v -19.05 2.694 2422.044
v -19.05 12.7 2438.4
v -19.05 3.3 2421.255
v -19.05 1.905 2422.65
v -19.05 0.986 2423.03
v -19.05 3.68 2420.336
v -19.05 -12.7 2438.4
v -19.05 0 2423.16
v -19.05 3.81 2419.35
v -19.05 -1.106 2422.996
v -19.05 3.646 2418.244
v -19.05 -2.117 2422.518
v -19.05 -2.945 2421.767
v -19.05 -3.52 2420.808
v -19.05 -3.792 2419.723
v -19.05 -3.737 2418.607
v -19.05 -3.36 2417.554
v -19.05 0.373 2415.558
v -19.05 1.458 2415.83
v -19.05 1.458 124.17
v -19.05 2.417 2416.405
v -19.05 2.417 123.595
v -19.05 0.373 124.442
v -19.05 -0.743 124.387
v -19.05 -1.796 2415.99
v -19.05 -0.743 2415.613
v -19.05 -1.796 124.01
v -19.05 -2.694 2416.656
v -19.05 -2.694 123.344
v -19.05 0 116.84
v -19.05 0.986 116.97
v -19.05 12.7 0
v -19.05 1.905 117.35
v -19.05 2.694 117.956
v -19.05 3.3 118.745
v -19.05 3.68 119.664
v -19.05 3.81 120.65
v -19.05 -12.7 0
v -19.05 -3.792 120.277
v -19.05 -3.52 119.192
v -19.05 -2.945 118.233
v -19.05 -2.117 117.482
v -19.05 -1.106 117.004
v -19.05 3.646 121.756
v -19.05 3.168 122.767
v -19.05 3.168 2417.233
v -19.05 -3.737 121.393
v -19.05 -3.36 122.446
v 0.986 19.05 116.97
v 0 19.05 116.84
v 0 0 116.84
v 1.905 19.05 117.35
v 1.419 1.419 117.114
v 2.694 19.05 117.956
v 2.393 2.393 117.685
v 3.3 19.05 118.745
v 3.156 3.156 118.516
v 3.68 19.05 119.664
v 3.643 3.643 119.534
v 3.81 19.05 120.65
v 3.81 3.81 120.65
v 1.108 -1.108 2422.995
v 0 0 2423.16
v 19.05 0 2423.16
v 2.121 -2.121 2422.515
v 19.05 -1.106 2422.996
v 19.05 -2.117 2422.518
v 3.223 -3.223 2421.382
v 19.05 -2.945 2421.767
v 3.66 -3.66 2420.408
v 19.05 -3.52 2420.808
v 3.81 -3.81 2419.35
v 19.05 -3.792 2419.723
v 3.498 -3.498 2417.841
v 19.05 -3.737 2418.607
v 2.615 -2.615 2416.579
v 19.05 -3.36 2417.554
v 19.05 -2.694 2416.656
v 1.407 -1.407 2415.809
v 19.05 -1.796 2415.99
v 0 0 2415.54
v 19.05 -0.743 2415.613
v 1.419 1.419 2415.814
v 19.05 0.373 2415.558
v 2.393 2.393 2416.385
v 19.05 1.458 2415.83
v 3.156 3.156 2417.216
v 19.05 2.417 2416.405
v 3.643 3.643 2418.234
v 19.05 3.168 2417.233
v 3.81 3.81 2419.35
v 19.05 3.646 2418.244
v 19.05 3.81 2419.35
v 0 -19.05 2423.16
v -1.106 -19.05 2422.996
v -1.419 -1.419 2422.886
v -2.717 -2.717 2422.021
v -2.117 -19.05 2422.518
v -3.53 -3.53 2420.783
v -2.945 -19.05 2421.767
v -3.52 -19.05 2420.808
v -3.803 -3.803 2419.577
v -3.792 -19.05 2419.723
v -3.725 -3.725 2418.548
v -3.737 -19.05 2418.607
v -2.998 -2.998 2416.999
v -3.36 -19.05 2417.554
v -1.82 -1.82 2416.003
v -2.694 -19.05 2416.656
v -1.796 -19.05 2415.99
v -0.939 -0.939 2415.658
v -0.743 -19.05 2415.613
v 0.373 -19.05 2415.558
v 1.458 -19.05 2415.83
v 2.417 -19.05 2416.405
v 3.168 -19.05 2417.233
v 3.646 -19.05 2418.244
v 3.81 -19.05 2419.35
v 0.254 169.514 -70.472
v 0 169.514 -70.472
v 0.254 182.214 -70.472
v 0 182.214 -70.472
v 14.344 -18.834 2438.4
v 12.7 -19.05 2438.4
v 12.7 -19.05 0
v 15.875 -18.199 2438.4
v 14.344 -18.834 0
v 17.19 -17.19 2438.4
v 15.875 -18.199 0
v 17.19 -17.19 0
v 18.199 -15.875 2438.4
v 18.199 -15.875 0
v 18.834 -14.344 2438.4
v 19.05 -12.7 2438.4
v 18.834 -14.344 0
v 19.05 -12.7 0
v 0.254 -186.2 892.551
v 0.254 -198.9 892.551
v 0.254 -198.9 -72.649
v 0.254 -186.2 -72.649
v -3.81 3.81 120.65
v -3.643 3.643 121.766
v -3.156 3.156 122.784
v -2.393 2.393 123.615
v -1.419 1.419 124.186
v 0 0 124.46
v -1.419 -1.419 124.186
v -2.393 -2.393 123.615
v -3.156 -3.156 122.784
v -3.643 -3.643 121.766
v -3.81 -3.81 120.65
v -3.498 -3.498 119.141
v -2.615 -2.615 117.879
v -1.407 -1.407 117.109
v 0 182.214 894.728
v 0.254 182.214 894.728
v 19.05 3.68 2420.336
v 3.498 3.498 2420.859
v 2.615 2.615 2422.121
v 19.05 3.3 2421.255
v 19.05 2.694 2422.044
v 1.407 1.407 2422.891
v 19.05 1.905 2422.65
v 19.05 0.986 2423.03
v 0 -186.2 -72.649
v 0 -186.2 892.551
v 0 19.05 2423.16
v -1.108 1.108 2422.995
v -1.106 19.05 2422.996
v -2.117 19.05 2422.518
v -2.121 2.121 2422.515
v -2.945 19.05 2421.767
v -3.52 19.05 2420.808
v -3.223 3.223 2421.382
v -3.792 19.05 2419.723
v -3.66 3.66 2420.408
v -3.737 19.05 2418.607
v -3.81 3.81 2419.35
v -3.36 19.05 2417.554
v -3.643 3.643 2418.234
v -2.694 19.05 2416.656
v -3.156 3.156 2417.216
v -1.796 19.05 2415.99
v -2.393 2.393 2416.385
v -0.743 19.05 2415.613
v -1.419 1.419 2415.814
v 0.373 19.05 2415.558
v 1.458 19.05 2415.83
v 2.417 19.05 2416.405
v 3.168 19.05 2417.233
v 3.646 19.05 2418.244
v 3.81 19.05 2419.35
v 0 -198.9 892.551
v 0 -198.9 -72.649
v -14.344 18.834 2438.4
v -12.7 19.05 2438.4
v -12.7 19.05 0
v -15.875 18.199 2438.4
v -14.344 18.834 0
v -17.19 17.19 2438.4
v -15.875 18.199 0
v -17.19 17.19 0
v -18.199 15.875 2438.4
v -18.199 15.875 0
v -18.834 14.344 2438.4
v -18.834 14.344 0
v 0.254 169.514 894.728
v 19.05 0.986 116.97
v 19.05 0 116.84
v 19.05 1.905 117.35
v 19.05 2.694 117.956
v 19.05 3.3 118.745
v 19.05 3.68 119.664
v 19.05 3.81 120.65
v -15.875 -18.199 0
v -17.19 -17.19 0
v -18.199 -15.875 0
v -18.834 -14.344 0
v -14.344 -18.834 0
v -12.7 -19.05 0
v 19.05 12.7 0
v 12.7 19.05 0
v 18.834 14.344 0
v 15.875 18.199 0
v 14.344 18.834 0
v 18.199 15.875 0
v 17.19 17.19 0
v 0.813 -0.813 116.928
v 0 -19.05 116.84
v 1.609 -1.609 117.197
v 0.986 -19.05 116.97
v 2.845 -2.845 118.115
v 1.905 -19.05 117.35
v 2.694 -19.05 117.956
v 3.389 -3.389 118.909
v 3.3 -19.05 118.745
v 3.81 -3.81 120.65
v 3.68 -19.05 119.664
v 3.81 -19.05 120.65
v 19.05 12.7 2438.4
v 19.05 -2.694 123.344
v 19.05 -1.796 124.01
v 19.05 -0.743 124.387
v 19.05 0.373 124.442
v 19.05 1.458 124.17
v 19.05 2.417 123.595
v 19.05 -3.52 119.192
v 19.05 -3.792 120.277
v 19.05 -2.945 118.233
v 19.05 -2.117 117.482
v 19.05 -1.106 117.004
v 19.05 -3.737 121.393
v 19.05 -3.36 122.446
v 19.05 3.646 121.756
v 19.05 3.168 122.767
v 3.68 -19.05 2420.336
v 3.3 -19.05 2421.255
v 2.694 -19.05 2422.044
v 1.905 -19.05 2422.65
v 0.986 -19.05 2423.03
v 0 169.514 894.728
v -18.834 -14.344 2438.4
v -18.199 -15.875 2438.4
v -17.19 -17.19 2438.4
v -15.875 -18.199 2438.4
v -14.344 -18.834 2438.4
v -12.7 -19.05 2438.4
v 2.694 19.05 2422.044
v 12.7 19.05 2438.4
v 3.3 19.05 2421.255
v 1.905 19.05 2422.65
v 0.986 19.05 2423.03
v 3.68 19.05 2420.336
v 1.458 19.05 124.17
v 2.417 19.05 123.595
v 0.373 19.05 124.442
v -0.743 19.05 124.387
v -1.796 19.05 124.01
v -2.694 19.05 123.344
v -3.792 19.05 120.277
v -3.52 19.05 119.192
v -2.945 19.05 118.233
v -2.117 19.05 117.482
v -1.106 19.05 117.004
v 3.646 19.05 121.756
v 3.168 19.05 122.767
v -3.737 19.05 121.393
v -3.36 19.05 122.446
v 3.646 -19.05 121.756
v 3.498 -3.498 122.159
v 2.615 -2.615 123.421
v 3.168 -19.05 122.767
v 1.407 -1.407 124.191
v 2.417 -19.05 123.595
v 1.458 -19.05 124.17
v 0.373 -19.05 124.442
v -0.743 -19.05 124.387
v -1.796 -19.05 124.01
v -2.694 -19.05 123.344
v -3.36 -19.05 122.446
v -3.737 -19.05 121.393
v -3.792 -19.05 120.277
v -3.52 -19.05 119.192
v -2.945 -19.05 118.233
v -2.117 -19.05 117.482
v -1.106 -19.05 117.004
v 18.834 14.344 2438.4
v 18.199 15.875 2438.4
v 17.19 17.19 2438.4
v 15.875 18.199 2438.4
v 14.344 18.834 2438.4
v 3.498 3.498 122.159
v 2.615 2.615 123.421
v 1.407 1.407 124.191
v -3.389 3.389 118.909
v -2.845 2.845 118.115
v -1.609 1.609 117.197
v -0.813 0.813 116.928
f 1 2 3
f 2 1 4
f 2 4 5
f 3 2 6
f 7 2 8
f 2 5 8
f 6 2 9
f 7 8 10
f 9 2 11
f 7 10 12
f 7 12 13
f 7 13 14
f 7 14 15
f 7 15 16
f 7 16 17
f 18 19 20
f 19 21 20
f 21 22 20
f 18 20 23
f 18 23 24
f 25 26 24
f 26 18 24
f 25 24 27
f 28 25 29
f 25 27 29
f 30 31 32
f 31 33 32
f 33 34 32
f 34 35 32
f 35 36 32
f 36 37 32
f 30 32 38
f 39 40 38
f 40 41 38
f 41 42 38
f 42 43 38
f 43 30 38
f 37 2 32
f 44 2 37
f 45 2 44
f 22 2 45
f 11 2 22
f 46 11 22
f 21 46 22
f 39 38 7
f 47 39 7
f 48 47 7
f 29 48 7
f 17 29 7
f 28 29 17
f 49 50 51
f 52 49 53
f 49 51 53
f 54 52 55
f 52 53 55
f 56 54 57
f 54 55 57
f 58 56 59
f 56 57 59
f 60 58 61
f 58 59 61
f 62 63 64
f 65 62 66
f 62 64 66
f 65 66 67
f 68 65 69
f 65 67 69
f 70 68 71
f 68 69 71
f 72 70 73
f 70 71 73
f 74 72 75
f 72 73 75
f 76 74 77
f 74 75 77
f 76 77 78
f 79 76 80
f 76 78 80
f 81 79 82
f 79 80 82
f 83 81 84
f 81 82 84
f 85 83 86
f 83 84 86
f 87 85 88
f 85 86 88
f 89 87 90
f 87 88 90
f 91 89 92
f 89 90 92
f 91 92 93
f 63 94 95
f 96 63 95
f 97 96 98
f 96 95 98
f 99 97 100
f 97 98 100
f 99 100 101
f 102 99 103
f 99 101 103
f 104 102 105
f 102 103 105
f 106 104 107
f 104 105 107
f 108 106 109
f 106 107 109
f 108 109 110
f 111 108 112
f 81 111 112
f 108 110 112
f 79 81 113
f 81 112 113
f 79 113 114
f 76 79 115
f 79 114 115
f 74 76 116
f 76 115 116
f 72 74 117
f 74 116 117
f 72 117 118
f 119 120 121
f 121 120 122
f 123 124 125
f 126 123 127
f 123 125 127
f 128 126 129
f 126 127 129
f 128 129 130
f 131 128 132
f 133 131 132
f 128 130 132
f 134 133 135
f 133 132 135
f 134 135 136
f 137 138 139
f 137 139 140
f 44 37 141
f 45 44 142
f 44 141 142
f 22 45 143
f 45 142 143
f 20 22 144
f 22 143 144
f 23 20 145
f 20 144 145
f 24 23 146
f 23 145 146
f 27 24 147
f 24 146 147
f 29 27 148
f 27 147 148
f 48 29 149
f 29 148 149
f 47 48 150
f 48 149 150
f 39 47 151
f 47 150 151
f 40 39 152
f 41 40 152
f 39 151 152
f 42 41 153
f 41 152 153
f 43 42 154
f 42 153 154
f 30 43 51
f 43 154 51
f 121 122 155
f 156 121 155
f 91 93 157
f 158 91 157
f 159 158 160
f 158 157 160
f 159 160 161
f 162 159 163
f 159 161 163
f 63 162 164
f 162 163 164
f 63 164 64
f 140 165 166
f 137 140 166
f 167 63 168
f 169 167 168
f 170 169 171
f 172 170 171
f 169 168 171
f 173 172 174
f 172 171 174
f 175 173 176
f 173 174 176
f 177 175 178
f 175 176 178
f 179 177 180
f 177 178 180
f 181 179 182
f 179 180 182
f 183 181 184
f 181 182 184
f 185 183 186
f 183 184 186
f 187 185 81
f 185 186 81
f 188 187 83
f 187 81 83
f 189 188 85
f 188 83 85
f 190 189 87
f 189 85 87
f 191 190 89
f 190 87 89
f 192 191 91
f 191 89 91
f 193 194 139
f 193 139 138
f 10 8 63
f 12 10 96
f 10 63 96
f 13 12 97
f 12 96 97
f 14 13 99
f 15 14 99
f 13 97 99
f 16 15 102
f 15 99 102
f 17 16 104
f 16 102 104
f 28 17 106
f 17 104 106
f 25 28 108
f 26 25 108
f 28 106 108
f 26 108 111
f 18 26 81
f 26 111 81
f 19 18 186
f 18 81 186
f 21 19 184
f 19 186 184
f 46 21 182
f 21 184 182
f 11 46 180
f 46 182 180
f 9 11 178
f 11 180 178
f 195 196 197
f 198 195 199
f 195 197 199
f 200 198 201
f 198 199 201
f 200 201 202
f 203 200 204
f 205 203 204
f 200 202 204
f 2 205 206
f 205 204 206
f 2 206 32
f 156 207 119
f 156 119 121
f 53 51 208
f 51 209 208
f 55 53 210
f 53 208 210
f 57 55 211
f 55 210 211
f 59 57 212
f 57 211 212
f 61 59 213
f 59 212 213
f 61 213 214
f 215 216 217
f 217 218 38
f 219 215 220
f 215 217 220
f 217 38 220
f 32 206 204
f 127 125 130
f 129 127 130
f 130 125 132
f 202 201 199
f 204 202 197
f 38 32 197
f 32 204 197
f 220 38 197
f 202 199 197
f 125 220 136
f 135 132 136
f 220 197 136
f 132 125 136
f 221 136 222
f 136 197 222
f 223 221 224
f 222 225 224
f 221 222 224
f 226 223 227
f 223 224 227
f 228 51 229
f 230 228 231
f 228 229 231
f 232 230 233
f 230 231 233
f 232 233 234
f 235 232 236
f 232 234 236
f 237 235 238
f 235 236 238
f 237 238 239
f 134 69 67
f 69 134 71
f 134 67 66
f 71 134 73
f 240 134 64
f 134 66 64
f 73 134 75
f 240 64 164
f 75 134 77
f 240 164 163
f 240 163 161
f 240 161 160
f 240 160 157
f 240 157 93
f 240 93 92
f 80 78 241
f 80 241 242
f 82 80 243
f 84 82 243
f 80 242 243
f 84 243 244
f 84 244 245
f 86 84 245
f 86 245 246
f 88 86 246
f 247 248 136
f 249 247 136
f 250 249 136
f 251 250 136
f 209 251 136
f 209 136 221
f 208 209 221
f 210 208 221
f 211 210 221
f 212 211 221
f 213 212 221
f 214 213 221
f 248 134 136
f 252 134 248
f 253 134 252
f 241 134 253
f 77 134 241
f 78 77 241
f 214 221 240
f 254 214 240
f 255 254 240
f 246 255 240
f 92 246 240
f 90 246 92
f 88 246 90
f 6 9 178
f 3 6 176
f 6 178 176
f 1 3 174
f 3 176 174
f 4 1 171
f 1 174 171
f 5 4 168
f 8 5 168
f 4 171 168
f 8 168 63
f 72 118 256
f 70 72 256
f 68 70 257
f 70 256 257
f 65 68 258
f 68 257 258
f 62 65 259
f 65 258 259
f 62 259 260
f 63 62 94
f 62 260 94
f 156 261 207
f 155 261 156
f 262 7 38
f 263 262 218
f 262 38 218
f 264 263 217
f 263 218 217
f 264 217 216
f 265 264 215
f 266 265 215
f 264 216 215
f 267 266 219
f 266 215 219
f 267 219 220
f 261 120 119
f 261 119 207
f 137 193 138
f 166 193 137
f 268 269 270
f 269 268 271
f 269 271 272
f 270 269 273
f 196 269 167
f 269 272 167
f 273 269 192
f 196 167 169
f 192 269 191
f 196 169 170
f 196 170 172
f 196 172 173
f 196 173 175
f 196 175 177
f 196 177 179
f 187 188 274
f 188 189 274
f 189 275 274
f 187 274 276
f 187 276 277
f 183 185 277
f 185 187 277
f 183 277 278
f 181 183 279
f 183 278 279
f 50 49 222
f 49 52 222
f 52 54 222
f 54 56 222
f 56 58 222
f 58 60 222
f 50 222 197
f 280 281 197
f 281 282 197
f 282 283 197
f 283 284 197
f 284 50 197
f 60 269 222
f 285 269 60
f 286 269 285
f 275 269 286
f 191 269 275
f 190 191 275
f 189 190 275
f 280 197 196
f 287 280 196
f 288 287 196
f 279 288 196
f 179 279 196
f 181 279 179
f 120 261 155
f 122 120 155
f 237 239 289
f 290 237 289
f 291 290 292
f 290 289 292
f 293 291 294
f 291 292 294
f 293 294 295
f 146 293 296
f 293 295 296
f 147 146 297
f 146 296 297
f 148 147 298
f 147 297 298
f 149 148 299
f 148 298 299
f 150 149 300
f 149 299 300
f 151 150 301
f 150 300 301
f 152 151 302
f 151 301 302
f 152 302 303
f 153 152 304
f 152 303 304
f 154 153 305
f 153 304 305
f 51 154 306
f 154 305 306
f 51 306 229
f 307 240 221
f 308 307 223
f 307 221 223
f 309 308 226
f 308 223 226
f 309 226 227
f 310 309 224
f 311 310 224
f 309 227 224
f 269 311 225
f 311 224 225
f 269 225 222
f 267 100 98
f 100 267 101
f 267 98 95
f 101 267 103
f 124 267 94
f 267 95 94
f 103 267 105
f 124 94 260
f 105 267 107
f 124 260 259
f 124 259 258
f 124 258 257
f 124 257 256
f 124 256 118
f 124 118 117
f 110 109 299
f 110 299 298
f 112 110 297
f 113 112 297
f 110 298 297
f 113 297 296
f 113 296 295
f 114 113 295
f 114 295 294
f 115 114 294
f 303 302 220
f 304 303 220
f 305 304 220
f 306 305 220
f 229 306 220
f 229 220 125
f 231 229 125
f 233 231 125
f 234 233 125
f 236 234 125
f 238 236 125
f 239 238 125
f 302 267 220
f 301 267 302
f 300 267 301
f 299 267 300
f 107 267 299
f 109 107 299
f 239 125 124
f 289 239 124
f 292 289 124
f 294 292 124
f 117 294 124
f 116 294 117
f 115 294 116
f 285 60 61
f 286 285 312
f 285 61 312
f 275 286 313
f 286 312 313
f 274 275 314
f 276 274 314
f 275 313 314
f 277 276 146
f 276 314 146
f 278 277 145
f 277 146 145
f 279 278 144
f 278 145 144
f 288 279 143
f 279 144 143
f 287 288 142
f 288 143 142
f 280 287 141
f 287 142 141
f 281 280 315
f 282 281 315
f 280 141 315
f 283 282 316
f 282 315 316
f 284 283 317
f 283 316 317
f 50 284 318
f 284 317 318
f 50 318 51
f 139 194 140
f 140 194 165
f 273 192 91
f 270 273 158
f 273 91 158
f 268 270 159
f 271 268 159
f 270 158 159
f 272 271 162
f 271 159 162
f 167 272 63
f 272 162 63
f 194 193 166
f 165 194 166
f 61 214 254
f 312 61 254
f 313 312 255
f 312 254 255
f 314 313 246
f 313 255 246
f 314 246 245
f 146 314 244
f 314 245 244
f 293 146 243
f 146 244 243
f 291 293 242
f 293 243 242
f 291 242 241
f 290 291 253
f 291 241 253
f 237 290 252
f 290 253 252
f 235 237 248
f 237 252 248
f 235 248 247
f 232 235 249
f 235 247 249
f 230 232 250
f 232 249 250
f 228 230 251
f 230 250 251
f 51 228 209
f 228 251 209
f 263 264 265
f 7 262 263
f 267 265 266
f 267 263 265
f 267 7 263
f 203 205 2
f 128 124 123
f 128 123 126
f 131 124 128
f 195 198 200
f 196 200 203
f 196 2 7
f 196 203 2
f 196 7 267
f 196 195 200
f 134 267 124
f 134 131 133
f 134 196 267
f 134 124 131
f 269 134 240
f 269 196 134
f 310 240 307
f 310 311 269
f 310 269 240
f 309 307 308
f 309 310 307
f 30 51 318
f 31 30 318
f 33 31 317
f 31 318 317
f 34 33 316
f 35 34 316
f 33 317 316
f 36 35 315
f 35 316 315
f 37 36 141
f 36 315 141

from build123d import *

# Parameters (mm, degrees)
F1_DEPTH  = 2438.4
F2_W      = 12.7
F2_H      = 965.2
F4_DEPTH  = 0.254
F3_W      = 12.7
F3_H      = 965.2
F5_DEPTH  = 0.254
F7_DEPTH  = 38.1
F9_DEPTH  = 38.1
F11_DEPTH = 38.1
F13_DEPTH = 38.1


with BuildPart() as f1:
    # F0 (on Top) → F1 (new body)
    with BuildSketch(Plane.XY):
        with BuildLine():
            ThreePointArc((19.05, 12.7), (17.190128, 17.190128), (12.7, 19.05))
            Line((12.7, 19.05), (-12.7, 19.05))
            ThreePointArc((-12.7, 19.05), (-17.190128, 17.190128), (-19.05, 12.7))
            Line((-19.05, 12.7), (-19.05, -12.7))
            ThreePointArc((-19.05, -12.7), (-17.190128, -17.190128), (-12.7, -19.05))
            Line((-12.7, -19.05), (12.7, -19.05))
            ThreePointArc((12.7, -19.05), (17.190128, -17.190128), (19.05, -12.7))
            Line((19.05, -12.7), (19.05, 12.7))
        make_face()
    extrude(amount=F1_DEPTH)

    # F6 (on face) → F7 (cut)
    with BuildSketch(Plane.XZ.offset(19.05)):
        with BuildLine():
            ThreePointArc((0, 116.84), (2.694077, 117.955923), (3.81, 120.65))
            ThreePointArc((3.81, 120.65), (-2.694077, 123.344077), (0, 116.84))
        make_face()
    extrude(amount=-F7_DEPTH, mode=Mode.SUBTRACT)

    # F8 (on face) → F9 (cut)
    with BuildSketch(Plane.YZ.offset(19.05)):
        with BuildLine():
            ThreePointArc((0, 116.84), (2.694077, 117.955923), (3.81, 120.65))
            ThreePointArc((3.81, 120.65), (-2.694077, 123.344077), (0, 116.84))
        make_face()
    extrude(amount=-F9_DEPTH, mode=Mode.SUBTRACT)

    # F10 (on face) → F11 (cut)
    with BuildSketch(Plane.YZ.offset(19.05)):
        with BuildLine():
            ThreePointArc((0, 2423.16), (-2.694077, 2416.655923), (3.81, 2419.35))
            ThreePointArc((3.81, 2419.35), (2.694077, 2422.044077), (0, 2423.16))
        make_face()
    extrude(amount=-F11_DEPTH, mode=Mode.SUBTRACT)

    # F12 (on face) → F13 (cut)
    with BuildSketch(Plane.XZ.offset(19.05)):
        with BuildLine():
            ThreePointArc((0, 2423.16), (-2.694077, 2416.655923), (3.81, 2419.35))
            ThreePointArc((3.81, 2419.35), (2.694077, 2422.044077), (0, 2423.16))
        make_face()
    extrude(amount=-F13_DEPTH, mode=Mode.SUBTRACT)


with BuildPart() as f4:
    # F2 (on Right) → F4 (new body)
    with BuildSketch(Plane.YZ):
        with Locations((-192.550282, 409.951065)):
            Rectangle(F2_W, F2_H)
    extrude(amount=F4_DEPTH)


with BuildPart() as f5:
    # F3 (on Right) → F5 (new body)
    with BuildSketch(Plane.YZ):
        with Locations((175.864179, 412.127815)):
            Rectangle(F3_W, F3_H)
    extrude(amount=F5_DEPTH)


solid = Compound([f1.part, f4.part, f5.part])
